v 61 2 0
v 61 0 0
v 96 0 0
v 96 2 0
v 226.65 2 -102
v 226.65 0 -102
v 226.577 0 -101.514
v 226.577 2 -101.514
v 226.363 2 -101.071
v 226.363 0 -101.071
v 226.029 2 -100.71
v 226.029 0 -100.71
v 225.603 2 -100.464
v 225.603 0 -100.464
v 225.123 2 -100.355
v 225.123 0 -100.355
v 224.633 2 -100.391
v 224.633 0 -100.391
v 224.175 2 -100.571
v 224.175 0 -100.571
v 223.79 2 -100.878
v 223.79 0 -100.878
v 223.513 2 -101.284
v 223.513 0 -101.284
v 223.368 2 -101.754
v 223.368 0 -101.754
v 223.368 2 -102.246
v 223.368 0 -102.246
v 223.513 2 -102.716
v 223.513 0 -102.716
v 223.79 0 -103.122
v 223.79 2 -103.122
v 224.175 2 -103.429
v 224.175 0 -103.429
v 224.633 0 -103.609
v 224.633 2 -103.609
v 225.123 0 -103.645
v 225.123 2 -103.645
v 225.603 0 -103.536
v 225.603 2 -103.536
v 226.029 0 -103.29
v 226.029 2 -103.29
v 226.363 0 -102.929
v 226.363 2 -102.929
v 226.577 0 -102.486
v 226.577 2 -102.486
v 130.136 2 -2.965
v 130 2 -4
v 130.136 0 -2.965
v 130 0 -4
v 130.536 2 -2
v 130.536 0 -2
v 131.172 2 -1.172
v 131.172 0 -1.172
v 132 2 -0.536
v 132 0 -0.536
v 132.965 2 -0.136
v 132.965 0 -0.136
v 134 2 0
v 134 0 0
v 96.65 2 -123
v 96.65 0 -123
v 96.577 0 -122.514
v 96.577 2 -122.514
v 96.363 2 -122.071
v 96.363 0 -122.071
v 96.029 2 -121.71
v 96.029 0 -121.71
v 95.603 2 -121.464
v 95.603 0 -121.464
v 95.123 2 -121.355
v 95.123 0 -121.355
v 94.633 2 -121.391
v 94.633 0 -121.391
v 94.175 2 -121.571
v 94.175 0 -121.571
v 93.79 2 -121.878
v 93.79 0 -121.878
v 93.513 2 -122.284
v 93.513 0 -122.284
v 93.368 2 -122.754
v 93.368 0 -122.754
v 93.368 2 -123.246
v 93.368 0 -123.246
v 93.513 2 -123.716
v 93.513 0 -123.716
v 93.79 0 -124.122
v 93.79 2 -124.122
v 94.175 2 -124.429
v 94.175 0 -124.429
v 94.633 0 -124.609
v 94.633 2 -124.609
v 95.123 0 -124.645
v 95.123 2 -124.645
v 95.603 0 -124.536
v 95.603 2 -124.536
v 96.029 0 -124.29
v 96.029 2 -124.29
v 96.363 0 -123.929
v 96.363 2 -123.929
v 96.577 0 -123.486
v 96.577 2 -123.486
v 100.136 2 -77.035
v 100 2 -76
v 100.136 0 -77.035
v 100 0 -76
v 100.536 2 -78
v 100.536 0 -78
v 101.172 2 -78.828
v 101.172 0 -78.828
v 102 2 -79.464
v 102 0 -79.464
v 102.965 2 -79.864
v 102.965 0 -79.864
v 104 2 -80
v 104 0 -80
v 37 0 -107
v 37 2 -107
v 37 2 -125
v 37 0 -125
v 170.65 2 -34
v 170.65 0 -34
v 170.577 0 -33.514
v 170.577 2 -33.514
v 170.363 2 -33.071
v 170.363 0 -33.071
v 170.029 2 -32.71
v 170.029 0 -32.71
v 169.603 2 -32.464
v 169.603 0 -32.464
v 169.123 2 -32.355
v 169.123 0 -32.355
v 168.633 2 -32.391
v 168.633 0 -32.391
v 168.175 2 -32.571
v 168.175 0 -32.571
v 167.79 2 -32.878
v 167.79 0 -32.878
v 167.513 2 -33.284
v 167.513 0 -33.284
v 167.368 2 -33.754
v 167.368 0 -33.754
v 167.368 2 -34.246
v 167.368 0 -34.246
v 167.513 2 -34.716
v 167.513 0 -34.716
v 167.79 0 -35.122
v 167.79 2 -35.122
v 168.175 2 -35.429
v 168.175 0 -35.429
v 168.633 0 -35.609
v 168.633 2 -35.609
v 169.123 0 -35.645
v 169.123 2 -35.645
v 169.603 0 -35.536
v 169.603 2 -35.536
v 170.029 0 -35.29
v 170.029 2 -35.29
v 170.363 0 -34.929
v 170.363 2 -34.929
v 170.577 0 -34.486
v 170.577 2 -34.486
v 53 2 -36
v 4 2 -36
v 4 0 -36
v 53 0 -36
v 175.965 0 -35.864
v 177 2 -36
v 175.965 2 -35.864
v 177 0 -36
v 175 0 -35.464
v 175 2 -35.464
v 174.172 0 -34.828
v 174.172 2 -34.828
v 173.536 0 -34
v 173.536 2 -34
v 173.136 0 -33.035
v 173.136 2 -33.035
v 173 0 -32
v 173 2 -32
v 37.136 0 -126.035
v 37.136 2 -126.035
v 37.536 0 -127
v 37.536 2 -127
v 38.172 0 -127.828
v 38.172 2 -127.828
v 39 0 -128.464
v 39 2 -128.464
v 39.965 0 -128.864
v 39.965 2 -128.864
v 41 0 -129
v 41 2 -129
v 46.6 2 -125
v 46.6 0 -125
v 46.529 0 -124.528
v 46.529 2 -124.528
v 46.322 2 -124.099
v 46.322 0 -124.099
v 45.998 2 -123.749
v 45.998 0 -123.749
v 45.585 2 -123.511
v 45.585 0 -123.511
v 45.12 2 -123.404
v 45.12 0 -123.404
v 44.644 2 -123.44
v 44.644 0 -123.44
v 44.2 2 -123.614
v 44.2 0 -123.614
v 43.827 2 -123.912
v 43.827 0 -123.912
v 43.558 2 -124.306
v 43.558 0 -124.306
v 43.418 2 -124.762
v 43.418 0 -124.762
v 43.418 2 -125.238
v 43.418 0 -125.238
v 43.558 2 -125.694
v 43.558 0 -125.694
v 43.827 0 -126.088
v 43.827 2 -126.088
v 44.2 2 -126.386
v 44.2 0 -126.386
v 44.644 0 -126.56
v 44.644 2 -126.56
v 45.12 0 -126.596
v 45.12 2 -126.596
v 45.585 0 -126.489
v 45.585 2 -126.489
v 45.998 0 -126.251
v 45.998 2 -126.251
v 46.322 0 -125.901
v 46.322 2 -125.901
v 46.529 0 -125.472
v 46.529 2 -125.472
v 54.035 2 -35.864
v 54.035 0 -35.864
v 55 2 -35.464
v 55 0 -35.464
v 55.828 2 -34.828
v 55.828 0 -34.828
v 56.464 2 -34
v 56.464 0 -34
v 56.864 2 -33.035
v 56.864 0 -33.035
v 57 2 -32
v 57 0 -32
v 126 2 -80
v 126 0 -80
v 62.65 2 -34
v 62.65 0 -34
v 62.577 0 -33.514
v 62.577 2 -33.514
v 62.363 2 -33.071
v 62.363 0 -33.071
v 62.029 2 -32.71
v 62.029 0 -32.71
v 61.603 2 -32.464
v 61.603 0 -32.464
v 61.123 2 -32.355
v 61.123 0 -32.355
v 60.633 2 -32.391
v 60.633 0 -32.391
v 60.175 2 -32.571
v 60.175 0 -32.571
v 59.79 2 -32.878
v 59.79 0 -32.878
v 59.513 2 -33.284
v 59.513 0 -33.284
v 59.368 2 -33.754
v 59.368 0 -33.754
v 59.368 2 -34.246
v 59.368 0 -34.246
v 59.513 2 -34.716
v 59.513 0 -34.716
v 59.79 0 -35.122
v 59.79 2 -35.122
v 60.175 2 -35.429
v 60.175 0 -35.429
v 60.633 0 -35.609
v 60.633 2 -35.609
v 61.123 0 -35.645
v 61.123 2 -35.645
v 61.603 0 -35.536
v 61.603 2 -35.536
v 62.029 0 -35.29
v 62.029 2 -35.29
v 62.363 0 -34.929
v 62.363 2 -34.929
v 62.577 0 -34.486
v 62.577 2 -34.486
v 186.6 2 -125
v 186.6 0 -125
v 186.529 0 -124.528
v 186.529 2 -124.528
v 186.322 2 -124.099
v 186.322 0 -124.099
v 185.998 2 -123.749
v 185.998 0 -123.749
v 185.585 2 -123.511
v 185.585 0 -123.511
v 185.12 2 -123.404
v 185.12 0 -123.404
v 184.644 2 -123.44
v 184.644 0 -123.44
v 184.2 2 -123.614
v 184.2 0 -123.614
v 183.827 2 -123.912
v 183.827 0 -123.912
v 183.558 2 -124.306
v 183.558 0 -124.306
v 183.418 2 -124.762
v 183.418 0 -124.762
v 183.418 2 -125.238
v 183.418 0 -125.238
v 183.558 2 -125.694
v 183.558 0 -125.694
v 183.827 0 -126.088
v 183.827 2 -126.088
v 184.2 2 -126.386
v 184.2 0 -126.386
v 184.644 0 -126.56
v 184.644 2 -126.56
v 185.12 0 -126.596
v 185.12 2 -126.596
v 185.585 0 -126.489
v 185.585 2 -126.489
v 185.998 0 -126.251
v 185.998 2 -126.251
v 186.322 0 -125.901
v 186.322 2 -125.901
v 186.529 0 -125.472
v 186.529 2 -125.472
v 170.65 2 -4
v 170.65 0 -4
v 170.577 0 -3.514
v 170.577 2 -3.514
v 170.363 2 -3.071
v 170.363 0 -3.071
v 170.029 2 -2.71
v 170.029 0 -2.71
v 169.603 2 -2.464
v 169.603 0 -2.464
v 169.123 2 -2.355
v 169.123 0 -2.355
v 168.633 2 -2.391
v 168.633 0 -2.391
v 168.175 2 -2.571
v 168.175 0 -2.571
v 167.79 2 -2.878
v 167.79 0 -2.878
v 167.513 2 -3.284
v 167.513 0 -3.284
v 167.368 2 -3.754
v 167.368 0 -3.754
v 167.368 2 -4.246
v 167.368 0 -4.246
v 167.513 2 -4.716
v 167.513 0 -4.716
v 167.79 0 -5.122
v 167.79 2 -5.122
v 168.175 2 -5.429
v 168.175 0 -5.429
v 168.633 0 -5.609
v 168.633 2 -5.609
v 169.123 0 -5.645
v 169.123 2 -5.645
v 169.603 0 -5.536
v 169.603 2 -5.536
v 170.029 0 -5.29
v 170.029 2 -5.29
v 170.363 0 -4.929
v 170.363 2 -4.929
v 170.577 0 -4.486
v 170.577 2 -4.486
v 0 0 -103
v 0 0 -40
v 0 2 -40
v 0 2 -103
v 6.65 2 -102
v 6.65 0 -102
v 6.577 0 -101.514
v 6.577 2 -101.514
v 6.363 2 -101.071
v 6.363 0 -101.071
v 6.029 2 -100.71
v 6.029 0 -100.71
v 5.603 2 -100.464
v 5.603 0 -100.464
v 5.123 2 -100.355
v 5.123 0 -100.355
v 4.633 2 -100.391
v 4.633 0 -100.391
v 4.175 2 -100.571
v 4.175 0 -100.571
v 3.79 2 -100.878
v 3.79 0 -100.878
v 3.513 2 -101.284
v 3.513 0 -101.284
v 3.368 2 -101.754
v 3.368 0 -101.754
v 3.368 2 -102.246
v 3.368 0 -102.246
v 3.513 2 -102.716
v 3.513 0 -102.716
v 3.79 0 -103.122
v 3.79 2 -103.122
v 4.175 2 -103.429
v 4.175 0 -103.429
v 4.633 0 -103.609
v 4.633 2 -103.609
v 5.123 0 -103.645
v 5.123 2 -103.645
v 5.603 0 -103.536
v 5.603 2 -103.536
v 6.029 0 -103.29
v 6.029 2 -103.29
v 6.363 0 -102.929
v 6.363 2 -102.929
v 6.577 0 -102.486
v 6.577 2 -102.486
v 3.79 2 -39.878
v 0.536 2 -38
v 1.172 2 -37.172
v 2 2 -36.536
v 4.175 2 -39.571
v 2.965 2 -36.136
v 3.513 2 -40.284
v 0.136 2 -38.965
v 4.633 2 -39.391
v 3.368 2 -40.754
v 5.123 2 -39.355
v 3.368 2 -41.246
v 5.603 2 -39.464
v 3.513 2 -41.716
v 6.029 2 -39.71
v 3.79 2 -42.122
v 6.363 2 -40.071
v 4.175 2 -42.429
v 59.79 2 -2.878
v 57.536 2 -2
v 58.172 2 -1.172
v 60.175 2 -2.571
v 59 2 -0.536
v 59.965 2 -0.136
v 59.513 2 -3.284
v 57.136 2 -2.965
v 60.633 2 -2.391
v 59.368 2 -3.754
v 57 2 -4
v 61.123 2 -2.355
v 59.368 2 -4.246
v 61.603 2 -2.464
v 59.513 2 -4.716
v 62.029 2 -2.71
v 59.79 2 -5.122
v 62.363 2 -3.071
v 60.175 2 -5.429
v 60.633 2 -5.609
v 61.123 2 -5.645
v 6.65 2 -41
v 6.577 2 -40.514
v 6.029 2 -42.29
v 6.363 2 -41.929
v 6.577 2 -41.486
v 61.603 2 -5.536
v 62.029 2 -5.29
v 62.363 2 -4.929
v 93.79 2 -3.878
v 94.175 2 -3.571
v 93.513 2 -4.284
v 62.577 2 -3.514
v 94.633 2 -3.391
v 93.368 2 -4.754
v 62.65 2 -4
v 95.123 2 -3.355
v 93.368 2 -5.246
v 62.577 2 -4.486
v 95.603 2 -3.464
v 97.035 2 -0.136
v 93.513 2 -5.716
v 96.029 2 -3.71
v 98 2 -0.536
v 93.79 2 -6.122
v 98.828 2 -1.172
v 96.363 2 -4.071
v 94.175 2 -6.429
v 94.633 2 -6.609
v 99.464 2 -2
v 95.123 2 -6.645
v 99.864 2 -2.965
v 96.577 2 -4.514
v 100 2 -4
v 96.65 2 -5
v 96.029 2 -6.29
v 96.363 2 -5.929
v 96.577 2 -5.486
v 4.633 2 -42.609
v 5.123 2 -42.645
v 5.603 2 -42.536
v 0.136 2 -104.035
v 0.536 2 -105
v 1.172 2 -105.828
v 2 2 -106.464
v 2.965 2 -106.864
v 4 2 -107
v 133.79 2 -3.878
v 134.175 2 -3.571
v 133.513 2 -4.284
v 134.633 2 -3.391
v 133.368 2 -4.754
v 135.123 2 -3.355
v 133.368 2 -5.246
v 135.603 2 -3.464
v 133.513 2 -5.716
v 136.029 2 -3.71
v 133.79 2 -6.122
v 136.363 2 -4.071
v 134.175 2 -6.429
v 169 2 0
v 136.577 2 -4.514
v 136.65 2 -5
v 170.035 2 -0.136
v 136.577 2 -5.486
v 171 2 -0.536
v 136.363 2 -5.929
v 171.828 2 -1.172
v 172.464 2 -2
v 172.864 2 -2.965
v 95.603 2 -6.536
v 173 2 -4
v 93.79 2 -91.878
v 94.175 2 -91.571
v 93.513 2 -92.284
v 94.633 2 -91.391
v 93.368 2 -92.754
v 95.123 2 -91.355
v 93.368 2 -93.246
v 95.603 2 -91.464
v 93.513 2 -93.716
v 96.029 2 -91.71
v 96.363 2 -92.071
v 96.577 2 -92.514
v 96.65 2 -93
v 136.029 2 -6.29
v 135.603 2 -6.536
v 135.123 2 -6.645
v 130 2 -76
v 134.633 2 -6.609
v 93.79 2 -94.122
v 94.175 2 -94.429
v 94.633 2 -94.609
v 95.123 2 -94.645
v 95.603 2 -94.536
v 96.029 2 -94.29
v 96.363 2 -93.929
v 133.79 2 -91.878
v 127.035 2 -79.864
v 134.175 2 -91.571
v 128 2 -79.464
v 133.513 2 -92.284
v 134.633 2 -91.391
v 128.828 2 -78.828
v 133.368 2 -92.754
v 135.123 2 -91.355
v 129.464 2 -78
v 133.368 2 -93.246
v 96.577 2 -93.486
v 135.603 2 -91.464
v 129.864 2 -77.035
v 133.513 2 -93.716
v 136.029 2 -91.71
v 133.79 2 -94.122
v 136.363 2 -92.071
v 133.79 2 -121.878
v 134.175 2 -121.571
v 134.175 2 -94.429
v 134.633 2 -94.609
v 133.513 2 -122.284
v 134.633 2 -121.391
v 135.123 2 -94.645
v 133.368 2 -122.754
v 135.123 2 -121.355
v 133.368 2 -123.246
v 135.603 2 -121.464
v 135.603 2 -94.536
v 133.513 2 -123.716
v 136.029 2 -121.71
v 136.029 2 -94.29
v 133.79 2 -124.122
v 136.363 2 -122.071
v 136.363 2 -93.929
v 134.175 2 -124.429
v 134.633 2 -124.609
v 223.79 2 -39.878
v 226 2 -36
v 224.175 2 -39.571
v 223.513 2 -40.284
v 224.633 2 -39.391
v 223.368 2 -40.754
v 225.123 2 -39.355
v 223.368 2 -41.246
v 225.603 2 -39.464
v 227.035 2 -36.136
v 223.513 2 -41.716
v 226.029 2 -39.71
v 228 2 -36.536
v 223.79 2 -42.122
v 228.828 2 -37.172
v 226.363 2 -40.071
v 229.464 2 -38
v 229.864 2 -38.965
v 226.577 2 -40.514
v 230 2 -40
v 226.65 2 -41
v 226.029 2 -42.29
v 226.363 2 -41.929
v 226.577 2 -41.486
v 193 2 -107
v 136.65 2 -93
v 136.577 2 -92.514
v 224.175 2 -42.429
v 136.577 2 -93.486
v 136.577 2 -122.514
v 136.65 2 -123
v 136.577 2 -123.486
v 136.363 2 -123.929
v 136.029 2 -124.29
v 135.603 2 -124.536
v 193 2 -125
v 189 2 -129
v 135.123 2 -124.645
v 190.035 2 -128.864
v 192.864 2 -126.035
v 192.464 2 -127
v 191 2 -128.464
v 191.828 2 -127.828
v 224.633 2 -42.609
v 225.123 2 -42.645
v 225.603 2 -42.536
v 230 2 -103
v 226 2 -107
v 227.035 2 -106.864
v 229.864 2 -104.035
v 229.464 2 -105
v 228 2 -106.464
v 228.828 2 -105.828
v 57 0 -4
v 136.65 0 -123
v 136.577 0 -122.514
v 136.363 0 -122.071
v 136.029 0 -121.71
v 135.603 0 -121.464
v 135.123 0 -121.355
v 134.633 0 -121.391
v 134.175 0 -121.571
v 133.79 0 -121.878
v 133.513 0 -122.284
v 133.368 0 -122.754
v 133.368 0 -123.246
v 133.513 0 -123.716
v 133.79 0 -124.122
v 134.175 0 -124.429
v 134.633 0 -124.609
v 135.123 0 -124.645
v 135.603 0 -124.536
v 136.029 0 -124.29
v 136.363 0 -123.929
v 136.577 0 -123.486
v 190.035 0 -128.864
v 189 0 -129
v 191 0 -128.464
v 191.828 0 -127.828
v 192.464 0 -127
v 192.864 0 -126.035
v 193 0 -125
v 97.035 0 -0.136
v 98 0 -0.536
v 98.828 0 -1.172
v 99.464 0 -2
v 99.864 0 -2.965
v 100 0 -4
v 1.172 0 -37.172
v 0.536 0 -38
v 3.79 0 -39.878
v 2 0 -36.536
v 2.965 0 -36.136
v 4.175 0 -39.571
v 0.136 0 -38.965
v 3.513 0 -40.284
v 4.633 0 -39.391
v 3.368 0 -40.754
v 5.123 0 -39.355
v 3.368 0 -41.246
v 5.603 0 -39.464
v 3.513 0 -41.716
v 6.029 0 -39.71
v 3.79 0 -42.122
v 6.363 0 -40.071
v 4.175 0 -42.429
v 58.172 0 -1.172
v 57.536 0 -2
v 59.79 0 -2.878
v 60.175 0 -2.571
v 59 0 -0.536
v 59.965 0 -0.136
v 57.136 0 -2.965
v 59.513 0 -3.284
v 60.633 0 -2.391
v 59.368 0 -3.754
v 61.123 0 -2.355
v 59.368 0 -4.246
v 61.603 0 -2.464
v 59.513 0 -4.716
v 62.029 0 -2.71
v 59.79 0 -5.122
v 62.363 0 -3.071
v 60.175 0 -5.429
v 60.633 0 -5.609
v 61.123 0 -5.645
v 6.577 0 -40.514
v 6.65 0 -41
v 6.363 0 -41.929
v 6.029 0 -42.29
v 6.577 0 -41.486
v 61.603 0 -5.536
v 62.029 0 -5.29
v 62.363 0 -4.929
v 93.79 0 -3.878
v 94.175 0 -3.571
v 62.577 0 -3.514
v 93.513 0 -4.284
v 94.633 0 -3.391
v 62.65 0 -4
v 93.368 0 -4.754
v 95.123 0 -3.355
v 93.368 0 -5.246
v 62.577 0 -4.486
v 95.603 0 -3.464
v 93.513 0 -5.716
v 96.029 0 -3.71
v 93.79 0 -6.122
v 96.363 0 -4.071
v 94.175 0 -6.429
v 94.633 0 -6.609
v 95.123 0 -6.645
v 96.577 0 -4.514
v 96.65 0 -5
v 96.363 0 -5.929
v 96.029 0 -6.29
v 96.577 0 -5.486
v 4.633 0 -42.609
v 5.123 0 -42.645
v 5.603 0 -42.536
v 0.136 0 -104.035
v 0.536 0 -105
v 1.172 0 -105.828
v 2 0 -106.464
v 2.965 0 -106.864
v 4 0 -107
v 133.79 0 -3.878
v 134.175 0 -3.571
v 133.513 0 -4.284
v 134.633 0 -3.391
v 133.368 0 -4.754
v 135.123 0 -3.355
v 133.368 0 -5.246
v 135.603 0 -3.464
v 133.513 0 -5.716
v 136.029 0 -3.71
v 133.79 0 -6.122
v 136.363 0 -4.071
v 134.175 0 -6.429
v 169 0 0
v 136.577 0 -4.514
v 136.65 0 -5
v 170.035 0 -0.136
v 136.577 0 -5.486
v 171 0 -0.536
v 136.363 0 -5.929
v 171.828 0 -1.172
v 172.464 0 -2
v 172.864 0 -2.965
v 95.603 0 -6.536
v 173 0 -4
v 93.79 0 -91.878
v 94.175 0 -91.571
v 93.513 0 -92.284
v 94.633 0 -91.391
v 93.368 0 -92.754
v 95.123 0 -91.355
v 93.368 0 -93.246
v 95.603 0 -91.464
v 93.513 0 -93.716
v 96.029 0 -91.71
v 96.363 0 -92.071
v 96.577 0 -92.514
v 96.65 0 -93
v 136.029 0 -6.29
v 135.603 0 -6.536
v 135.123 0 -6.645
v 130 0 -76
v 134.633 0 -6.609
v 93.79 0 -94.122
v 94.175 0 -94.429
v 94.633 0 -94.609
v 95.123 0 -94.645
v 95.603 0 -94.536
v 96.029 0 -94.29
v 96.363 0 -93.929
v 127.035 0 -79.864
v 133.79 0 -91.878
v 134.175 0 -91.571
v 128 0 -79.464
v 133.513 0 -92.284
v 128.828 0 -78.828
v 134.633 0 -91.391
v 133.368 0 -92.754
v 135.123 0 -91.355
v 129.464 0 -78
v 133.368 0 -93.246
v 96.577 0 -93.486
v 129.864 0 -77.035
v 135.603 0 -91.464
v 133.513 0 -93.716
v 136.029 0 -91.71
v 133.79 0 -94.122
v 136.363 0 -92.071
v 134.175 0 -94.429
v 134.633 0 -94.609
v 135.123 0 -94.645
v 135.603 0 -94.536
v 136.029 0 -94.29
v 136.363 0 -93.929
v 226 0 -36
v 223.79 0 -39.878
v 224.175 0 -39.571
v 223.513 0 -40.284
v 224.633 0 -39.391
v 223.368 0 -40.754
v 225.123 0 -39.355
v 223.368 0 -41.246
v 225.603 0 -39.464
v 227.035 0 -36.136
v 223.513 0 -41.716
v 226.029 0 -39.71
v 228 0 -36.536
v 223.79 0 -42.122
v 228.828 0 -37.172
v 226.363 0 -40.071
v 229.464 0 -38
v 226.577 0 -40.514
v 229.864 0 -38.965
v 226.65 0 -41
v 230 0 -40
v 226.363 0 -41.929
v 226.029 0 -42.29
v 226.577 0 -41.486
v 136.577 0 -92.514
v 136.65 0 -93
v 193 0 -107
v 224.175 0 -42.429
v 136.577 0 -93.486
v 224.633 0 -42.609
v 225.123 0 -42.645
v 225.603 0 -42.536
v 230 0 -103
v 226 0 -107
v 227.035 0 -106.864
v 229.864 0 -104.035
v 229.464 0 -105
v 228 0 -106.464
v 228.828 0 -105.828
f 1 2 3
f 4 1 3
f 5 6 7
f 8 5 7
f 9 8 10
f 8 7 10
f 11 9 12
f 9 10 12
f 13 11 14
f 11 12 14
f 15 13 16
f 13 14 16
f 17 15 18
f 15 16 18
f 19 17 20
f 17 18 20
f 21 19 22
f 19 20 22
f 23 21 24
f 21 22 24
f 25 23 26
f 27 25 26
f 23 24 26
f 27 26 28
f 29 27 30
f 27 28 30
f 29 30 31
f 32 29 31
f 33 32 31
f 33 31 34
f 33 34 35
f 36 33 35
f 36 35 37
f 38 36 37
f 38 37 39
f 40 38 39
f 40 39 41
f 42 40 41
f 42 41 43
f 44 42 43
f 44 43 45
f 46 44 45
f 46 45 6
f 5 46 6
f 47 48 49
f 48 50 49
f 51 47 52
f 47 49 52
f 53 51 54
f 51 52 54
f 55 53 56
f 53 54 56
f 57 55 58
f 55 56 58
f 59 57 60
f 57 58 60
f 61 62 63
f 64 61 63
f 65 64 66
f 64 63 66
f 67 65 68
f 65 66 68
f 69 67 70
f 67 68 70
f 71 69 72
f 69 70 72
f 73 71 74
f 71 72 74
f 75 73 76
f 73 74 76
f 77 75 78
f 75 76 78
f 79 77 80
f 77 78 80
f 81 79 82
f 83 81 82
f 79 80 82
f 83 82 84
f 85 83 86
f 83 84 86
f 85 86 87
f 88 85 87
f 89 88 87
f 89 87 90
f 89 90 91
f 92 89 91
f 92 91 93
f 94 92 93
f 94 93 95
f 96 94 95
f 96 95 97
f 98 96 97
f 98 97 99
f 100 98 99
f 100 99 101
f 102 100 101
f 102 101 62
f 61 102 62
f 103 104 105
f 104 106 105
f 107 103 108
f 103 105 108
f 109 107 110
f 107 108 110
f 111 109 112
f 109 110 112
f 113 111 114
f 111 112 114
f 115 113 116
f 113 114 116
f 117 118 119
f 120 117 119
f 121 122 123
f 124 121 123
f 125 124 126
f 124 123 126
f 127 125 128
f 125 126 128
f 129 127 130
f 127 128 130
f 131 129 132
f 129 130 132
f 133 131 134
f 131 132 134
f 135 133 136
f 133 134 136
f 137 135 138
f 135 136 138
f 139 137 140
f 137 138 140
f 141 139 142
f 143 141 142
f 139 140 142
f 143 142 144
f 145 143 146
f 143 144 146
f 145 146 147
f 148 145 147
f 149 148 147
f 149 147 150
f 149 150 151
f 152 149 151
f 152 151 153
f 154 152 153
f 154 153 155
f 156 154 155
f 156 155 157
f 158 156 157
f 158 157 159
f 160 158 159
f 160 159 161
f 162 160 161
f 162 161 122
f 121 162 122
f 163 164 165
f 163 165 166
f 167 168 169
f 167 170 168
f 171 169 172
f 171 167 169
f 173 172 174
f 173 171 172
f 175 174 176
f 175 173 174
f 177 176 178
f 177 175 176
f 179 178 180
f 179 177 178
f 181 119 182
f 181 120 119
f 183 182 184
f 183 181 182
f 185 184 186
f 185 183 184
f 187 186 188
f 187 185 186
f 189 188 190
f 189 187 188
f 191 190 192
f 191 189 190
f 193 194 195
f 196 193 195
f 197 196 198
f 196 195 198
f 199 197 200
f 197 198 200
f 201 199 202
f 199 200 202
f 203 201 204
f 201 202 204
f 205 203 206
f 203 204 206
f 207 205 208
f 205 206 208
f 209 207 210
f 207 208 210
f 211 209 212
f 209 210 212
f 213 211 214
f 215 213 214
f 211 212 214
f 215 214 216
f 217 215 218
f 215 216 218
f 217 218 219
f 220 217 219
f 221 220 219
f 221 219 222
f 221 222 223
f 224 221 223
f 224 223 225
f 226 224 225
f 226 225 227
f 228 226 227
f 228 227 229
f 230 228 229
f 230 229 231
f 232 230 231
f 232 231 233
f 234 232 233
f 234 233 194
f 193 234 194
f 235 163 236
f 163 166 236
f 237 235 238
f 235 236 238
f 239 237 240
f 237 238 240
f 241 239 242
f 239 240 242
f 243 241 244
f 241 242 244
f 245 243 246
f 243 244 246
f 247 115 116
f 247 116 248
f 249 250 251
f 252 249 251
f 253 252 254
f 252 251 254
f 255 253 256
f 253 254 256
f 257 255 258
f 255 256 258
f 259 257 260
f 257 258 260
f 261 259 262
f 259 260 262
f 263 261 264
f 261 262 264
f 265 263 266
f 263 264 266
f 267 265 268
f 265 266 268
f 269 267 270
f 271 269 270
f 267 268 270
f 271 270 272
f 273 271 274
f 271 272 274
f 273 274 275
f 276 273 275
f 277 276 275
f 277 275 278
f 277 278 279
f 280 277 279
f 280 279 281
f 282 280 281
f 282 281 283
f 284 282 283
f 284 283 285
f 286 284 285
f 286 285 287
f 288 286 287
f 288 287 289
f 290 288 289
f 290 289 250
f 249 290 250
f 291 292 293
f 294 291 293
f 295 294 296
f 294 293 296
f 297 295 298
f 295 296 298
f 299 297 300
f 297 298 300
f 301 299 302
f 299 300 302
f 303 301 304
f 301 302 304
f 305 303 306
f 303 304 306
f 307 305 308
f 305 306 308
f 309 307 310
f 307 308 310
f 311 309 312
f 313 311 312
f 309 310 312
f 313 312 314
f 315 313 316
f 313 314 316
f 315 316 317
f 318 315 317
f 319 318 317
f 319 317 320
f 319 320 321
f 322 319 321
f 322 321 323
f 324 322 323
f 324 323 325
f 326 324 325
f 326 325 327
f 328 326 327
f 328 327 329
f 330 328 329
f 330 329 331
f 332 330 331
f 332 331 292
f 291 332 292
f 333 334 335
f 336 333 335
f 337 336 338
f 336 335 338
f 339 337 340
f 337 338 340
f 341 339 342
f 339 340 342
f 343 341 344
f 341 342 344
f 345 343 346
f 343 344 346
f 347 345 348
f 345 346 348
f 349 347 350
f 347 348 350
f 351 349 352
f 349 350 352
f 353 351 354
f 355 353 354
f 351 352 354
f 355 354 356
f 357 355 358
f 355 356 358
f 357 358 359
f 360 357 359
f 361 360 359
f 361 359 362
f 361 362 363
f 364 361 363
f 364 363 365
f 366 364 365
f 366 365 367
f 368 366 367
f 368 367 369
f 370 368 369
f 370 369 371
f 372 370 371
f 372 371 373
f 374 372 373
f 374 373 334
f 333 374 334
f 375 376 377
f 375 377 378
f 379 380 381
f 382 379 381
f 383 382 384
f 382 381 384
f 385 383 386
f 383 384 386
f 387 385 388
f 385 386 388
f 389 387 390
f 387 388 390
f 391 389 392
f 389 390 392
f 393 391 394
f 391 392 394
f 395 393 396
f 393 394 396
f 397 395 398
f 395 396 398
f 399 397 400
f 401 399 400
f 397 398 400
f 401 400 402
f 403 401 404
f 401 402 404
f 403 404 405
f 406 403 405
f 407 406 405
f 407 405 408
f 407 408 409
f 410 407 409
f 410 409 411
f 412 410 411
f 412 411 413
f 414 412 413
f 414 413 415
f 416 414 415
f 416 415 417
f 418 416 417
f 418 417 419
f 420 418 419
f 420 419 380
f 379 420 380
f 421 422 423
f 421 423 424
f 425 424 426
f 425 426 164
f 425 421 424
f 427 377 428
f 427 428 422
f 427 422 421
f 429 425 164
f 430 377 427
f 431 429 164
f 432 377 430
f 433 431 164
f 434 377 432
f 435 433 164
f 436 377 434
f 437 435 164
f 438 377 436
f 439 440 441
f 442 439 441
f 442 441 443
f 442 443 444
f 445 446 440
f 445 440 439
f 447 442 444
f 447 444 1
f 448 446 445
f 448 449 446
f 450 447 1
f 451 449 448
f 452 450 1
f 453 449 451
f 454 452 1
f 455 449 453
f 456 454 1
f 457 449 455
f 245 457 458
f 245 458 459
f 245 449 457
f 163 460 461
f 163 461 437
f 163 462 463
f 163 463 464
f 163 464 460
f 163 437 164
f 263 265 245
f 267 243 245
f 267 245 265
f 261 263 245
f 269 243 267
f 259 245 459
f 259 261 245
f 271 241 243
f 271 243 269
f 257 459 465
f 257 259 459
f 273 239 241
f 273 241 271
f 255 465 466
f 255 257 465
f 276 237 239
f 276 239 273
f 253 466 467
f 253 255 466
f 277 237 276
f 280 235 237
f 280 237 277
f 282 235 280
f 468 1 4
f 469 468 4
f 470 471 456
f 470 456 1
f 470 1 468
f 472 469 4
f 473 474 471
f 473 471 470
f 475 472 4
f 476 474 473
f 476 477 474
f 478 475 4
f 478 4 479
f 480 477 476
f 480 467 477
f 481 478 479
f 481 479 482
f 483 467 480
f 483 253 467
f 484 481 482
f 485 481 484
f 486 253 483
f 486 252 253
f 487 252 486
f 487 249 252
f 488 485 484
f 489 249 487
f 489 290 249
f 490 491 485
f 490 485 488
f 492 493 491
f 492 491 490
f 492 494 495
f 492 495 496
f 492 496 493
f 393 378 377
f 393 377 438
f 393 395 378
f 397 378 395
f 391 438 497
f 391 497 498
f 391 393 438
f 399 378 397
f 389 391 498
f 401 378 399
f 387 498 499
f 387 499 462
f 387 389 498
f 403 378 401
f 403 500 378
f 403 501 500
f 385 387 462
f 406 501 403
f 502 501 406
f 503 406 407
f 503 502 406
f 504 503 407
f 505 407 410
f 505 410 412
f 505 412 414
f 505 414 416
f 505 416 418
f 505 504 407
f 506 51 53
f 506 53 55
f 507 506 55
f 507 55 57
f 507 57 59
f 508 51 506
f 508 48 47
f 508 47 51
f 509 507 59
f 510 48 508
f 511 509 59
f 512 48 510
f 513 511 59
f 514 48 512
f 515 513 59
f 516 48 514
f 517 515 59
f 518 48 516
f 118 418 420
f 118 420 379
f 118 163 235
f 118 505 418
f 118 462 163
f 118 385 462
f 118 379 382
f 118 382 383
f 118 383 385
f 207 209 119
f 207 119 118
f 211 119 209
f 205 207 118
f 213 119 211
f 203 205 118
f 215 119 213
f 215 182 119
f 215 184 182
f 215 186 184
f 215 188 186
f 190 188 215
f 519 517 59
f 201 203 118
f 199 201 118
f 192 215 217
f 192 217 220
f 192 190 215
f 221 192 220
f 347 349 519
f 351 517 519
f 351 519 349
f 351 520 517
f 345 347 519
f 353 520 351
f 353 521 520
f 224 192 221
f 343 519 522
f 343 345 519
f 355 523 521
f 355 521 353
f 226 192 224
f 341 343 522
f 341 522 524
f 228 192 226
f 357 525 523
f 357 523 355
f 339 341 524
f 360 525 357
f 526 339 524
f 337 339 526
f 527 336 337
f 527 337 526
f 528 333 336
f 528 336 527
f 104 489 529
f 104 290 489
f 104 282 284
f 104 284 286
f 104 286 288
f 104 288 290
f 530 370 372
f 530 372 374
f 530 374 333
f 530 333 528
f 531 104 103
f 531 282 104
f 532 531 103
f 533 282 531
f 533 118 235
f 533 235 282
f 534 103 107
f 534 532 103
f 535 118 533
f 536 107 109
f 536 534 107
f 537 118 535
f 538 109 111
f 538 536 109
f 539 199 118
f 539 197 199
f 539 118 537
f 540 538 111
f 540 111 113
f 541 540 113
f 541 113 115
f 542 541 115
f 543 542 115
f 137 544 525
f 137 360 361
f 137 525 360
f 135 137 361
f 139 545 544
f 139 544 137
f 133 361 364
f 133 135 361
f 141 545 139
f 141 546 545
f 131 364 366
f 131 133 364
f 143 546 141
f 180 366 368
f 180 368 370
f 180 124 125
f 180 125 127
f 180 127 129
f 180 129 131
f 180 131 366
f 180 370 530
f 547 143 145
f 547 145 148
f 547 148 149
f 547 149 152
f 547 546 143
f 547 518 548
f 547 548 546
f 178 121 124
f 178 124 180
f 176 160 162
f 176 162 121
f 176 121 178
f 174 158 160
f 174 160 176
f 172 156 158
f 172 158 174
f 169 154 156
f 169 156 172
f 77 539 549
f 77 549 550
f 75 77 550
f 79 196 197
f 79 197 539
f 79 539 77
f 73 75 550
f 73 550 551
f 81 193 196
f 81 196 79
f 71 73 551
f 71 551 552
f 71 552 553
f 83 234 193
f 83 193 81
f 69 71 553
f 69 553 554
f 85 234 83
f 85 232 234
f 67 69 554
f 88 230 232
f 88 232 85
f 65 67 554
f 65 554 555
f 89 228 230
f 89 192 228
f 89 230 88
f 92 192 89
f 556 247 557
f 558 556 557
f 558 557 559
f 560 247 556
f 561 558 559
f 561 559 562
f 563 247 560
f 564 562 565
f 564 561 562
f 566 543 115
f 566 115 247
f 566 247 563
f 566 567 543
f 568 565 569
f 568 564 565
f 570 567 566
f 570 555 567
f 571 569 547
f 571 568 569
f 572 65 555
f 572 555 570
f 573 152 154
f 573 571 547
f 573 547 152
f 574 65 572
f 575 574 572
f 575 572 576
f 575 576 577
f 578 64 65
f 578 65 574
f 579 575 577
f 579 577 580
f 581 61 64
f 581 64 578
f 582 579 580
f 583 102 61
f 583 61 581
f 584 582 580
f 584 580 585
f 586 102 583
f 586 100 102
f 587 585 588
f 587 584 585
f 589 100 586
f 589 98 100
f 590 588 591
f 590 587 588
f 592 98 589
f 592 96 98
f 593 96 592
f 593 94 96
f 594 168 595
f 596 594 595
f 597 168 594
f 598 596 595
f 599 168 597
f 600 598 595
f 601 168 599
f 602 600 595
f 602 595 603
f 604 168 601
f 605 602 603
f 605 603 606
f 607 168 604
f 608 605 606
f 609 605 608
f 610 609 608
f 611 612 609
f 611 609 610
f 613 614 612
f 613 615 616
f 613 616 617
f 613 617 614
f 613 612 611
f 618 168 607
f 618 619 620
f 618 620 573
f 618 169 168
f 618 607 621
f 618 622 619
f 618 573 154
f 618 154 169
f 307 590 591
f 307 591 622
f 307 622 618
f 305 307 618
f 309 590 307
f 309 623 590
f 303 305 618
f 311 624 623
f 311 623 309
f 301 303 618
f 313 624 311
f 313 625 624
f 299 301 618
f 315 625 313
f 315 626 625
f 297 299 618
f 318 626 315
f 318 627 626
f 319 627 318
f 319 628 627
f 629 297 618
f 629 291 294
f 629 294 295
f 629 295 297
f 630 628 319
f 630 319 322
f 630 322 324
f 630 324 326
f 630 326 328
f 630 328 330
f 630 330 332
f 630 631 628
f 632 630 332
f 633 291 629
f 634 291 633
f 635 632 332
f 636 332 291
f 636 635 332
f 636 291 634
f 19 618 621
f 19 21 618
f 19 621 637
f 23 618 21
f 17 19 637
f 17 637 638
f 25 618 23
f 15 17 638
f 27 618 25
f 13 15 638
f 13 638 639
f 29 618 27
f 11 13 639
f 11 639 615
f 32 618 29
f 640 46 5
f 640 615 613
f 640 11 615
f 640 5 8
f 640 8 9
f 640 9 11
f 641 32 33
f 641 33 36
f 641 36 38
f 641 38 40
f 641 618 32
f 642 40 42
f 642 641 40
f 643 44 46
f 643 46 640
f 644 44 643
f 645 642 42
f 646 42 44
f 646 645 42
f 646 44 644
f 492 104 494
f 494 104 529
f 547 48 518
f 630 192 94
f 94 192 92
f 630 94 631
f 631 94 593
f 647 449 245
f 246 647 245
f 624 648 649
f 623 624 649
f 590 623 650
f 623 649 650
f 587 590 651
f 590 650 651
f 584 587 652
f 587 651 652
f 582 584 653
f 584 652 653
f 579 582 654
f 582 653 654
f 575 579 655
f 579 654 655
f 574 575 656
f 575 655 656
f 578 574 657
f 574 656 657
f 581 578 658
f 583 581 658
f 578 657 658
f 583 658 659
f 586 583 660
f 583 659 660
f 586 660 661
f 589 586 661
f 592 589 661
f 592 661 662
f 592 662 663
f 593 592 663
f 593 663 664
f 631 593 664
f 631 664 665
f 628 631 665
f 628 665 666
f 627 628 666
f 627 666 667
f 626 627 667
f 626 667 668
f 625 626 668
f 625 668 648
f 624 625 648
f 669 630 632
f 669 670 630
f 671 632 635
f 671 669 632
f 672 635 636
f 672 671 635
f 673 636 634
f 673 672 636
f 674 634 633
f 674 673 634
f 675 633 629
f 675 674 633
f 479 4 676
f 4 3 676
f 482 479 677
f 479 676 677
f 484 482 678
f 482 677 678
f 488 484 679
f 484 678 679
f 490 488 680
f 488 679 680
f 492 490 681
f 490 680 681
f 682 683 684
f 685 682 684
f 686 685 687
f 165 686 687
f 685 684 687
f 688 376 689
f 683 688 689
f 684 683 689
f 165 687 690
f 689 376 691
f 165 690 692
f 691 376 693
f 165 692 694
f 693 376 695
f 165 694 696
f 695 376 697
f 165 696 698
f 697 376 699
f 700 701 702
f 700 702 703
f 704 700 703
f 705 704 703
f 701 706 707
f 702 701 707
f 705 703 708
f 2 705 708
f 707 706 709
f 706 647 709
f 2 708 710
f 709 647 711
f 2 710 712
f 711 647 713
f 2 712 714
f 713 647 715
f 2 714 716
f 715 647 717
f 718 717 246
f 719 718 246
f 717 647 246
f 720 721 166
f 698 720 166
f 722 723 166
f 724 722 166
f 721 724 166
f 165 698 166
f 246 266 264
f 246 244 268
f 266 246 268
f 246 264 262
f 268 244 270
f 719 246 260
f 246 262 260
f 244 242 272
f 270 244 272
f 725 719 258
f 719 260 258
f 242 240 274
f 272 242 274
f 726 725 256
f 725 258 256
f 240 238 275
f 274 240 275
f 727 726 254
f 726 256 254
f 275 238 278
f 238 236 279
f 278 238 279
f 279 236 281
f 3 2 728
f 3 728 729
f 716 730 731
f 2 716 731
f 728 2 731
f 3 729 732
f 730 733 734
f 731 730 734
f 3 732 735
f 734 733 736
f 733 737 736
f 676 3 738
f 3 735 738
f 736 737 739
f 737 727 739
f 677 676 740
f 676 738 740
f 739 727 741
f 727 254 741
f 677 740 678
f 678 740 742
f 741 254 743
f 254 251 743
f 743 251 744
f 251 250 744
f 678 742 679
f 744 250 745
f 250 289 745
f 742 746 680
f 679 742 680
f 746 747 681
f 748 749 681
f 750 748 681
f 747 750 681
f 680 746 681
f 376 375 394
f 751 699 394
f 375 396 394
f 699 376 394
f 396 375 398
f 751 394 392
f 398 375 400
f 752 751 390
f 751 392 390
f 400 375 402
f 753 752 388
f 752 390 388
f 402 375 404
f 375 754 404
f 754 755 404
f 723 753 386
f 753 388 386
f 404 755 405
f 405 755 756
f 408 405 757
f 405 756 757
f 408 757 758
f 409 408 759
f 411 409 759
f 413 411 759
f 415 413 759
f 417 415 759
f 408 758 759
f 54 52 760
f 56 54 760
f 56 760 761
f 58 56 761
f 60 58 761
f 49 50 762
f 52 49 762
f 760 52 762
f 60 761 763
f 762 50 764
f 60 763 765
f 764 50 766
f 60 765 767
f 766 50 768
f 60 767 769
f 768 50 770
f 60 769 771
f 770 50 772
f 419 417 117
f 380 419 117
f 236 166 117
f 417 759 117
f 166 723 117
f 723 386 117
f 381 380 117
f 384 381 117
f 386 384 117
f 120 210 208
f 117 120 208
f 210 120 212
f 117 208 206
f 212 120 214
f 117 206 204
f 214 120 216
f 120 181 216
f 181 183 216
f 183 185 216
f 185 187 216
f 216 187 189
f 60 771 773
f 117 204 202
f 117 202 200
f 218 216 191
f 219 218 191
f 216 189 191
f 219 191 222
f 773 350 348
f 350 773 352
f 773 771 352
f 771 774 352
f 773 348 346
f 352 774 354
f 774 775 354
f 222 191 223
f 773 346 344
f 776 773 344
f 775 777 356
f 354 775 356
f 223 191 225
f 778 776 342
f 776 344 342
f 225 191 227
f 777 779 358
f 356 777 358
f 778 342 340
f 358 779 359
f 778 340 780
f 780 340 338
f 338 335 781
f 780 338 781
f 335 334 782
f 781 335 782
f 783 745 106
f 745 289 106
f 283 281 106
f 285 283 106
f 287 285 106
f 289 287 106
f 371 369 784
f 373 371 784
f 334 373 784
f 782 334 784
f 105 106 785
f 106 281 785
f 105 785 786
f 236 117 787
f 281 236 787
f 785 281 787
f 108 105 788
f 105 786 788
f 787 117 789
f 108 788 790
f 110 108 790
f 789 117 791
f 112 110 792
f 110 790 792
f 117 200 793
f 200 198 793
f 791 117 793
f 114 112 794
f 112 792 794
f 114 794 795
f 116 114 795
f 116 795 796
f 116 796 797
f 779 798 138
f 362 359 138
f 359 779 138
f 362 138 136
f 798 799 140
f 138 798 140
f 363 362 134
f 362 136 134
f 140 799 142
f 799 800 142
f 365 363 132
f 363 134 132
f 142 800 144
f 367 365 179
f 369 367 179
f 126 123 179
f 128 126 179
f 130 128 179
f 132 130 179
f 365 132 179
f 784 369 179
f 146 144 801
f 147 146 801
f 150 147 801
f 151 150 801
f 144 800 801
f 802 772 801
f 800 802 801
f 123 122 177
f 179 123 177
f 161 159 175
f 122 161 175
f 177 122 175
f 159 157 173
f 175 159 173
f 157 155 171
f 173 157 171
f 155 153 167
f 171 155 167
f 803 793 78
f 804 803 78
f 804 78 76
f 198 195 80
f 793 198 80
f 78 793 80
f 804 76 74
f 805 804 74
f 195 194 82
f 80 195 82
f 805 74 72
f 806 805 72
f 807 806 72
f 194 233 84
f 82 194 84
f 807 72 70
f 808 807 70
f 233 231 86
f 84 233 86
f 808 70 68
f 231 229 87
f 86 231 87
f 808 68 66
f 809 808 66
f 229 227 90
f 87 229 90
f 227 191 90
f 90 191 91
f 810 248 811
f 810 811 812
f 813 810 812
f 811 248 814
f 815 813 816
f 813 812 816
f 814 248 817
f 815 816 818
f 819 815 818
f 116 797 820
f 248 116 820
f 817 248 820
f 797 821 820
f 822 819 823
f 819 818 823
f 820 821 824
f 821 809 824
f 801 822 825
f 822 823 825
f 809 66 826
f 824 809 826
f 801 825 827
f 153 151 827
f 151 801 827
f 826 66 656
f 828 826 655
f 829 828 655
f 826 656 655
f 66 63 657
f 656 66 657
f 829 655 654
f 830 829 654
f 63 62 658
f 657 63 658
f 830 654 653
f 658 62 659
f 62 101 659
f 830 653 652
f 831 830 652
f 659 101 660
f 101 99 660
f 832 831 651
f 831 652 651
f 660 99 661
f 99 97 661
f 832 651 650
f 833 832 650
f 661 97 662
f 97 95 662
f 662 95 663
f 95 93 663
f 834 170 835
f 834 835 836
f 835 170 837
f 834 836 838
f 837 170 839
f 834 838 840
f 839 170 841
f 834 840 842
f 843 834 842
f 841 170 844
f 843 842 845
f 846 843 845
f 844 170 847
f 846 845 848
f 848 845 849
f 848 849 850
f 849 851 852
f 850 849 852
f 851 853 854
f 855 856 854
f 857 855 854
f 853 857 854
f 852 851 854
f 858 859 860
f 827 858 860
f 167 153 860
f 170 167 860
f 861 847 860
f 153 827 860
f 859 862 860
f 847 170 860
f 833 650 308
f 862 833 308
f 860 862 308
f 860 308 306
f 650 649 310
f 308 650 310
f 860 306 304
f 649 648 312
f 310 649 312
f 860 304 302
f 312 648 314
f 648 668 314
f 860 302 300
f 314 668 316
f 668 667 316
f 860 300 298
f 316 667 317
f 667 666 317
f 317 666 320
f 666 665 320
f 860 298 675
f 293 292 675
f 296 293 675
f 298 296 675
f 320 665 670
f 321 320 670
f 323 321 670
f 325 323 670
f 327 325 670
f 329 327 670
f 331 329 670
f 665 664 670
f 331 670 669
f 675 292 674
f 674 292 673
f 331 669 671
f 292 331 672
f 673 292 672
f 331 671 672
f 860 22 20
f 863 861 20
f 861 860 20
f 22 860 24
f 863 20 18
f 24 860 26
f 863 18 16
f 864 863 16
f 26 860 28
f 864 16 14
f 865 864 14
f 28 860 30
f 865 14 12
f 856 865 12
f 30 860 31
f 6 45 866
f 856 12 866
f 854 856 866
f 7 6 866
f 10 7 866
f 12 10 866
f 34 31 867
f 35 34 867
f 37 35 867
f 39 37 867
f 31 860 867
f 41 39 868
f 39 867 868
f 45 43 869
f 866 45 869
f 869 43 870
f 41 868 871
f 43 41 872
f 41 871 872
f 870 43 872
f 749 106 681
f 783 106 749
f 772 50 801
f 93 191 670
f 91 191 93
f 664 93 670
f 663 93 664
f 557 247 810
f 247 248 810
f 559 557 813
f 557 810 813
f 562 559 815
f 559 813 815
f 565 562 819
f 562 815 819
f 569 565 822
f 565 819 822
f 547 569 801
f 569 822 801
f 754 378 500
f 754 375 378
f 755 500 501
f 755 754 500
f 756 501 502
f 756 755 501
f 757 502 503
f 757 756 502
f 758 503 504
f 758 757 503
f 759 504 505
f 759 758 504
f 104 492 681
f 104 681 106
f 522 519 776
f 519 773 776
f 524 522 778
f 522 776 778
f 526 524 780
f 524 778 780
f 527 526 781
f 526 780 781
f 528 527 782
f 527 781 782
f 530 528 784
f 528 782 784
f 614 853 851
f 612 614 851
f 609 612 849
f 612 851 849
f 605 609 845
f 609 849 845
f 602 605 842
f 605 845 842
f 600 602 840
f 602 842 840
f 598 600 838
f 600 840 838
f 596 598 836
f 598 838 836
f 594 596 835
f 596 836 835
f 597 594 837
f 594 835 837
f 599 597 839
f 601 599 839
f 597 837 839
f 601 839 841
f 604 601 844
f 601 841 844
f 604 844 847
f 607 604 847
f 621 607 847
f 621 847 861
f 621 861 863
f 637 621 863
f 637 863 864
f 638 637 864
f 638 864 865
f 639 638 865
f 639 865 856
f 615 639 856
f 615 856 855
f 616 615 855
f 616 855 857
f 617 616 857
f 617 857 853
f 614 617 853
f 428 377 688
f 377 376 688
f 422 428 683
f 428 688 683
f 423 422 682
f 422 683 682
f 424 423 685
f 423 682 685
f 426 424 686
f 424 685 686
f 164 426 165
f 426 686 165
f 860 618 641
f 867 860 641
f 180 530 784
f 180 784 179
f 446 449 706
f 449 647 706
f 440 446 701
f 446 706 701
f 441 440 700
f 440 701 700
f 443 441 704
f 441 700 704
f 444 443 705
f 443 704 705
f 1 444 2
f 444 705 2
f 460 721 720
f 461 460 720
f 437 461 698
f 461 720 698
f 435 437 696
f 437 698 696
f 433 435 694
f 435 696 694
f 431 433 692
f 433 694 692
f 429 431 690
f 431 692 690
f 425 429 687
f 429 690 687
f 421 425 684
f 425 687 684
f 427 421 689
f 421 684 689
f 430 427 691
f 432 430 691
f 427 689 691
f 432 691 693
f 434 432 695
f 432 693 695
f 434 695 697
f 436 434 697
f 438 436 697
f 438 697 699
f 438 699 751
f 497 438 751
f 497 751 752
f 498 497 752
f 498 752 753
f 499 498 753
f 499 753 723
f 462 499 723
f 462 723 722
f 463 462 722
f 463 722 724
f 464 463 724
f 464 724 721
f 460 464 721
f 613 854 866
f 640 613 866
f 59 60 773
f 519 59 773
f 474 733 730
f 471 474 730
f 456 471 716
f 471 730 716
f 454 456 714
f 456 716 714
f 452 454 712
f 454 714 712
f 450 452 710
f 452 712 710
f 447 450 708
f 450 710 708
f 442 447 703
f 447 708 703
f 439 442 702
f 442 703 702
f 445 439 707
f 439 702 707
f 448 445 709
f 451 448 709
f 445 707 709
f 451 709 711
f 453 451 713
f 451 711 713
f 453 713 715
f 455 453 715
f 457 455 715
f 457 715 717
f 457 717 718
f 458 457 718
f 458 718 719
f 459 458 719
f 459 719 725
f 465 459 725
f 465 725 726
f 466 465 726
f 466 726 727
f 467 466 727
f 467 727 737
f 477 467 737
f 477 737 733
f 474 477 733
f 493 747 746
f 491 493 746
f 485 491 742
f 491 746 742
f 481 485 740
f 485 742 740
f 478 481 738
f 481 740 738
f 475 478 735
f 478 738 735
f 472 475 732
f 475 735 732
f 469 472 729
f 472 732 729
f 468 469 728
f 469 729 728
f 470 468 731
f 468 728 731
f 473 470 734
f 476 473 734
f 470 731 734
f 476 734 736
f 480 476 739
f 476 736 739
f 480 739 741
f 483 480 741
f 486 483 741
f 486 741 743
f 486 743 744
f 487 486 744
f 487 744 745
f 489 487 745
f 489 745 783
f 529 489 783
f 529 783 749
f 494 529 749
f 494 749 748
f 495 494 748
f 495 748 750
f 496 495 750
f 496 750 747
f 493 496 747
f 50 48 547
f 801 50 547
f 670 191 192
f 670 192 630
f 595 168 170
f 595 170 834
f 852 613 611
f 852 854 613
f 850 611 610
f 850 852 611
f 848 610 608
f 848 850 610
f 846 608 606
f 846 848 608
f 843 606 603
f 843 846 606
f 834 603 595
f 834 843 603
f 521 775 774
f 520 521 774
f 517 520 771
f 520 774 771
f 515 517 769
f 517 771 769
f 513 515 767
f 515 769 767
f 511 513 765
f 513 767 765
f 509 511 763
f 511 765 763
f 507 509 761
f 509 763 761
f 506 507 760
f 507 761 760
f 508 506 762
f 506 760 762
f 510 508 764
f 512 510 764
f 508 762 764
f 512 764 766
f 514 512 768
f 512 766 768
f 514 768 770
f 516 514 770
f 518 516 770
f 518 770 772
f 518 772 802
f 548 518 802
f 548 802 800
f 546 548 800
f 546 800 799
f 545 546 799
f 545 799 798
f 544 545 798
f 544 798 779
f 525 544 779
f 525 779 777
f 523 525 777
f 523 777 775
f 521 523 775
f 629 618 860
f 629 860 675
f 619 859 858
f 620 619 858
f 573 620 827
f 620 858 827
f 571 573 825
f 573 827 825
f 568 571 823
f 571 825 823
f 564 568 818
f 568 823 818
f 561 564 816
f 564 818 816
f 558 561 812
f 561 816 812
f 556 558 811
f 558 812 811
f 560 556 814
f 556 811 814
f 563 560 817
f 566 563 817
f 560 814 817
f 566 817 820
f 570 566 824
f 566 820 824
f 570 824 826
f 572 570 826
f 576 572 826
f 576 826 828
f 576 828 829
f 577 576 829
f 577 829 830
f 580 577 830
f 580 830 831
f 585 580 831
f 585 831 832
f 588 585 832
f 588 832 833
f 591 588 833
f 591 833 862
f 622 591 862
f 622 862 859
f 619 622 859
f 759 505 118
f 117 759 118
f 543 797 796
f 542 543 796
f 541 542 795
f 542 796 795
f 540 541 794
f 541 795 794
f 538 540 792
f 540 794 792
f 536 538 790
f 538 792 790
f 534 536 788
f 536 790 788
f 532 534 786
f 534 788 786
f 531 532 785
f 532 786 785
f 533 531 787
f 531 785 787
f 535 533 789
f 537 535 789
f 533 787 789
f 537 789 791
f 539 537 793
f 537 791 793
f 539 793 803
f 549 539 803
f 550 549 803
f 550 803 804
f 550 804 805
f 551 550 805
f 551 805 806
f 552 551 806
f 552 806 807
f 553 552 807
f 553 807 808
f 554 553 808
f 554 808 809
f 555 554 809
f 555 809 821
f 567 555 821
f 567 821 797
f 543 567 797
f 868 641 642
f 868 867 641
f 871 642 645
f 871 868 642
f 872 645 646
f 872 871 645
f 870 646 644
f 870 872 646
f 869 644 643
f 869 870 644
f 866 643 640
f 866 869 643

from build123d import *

# Parameters (mm, degrees)
SKETCH1_W           = 230
SKETCH1_H           = 129
BOSS_EXTRUDE1_DEPTH = 2
SKETCH2_W           = 37
SKETCH2_H           = 22
SKETCH2_W_2         = 57
SKETCH2_H_2         = 36
SKETCH2_W_3         = 30
SKETCH2_H_3         = 80
CUT_EXTRUDE1_DEPTH  = 3
SKETCH3_R           = 1.65
SKETCH3_R_2         = 1.6
CUT_EXTRUDE2_DEPTH  = 10
FILLET1_R           = 4


with BuildPart() as part:
    # Sketch1 → Boss-Extrude1 (new body)
    with BuildSketch(Plane(origin=(0, 0, 0), x_dir=(1, 0, 0), z_dir=(0, 1, 0))):
        with Locations((115, 64.5)):
            Rectangle(SKETCH1_W, SKETCH1_H)
    extrude(amount=BOSS_EXTRUDE1_DEPTH)

    # Sketch2 → Cut-Extrude1 (cut, through all)
    with BuildSketch(Plane(origin=(0, 2, 0), x_dir=(1, 0, 0), z_dir=(0, 1, 0))):
        with Locations((18.5, 118)):
            Rectangle(SKETCH2_W, SKETCH2_H)
        with Locations((28.5, 18)):
            Rectangle(SKETCH2_W_2, SKETCH2_H_2)
        with Locations((211.5, 118)):
            Rectangle(SKETCH2_W, SKETCH2_H)
        with Locations((201.5, 18)):
            Rectangle(SKETCH2_W_2, SKETCH2_H_2)
        with Locations((115, 40)):
            Rectangle(SKETCH2_W_3, SKETCH2_H_3)
    extrude(amount=-CUT_EXTRUDE1_DEPTH, mode=Mode.SUBTRACT)

    # Sketch3 → Cut-Extrude2 (cut)
    with BuildSketch(Plane.XZ):
        with Locations((5, -41)):
            Circle(SKETCH3_R)
        with Locations((5, -102)):
            Circle(SKETCH3_R)
        with Locations((95, -5)):
            Circle(SKETCH3_R)
        with Locations((95, -93)):
            Circle(SKETCH3_R)
        with Locations((95, -123)):
            Circle(SKETCH3_R)
        with Locations((135, -93)):
            Circle(SKETCH3_R)
        with Locations((135, -5)):
            Circle(SKETCH3_R)
        with Locations((135, -123)):
            Circle(SKETCH3_R)
        with Locations((225, -41)):
            Circle(SKETCH3_R)
        with Locations((225, -102)):
            Circle(SKETCH3_R)
        with Locations((61, -34)):
            Circle(SKETCH3_R)
        with Locations((61, -4)):
            Circle(SKETCH3_R)
        with Locations((169, -34)):
            Circle(SKETCH3_R)
        with Locations((169, -4)):
            Circle(SKETCH3_R)
        with Locations((45, -125)):
            Circle(SKETCH3_R_2)
        with Locations((185, -125)):
            Circle(SKETCH3_R_2)
    extrude(amount=-CUT_EXTRUDE2_DEPTH, mode=Mode.SUBTRACT)

    # Fillet1
    fillet1_edges = [part.edges().sort_by_distance(p)[0] for p in [
        (0, 1, -36),
        (57, 1, -36),
        (57, 1, 0),
        (230, 1, -107),
        (193, 1, -129),
        (230, 1, -36),
        (173, 1, 0),
        (173, 1, -36),
        (100, 1, 0),
        (100, 1, -80),
        (130, 1, -80),
        (130, 1, 0),
        (0, 1, -107),
        (37, 1, -129),
    ]]
    fillet(fillet1_edges, radius=FILLET1_R)


solid = part.part
